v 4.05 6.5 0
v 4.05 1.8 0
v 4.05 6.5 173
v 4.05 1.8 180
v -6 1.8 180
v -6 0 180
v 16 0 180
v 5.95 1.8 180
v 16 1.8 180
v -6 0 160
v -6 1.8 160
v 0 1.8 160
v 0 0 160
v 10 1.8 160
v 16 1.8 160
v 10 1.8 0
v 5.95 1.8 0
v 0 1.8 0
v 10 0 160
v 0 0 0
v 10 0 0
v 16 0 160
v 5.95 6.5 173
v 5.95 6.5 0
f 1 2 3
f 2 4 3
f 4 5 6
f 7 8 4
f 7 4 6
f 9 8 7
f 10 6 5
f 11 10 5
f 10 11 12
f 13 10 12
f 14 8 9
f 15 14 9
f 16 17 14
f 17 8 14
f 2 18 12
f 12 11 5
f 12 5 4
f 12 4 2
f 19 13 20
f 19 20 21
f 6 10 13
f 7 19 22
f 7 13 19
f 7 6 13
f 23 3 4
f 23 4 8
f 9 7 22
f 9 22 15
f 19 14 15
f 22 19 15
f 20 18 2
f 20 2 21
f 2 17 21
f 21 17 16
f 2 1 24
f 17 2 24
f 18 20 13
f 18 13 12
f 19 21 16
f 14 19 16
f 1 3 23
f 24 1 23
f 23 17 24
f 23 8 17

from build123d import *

# Parameters (mm, degrees)
SKETCH1_W           = 10
SKETCH1_H           = 1.8
SKETCH1_W_2         = 1.9
SKETCH1_H_2         = 4.7
BOSS_EXTRUDE1_DEPTH = 180
SKETCH2_W           = 22
SKETCH2_H           = 1.8
BOSS_EXTRUDE2_DEPTH = 20
CHAMFER1_SIZE       = 7
CHAMFER1_SIZE2      = 4.7


with BuildPart() as part:
    # Sketch1 → Boss-Extrude1 (new body)
    with BuildSketch(Plane.XY):
        with Locations((5, 0.9)):
            Rectangle(SKETCH1_W, SKETCH1_H)
        with Locations((5, 4.15)):
            Rectangle(SKETCH1_W_2, SKETCH1_H_2)
    extrude(amount=BOSS_EXTRUDE1_DEPTH)

    # Sketch2 → Boss-Extrude2 (add)
    with BuildSketch(Plane.XY.offset(180)):
        with Locations((5, 0.9)):
            Rectangle(SKETCH2_W, SKETCH2_H)
    extrude(amount=-BOSS_EXTRUDE2_DEPTH)

    # Chamfer1
    chamfer1_edges = [part.edges().sort_by_distance(p)[0] for p in [
        (5, 6.5, 180),
    ]]
    chamfer1_side = [part.faces().sort_by_distance(p)[0] for p in [
        (5, 6.5, 90),
    ]]
    chamfer(chamfer1_edges, length=CHAMFER1_SIZE, length2=CHAMFER1_SIZE2, reference=chamfer1_side[0])


solid = part.part
